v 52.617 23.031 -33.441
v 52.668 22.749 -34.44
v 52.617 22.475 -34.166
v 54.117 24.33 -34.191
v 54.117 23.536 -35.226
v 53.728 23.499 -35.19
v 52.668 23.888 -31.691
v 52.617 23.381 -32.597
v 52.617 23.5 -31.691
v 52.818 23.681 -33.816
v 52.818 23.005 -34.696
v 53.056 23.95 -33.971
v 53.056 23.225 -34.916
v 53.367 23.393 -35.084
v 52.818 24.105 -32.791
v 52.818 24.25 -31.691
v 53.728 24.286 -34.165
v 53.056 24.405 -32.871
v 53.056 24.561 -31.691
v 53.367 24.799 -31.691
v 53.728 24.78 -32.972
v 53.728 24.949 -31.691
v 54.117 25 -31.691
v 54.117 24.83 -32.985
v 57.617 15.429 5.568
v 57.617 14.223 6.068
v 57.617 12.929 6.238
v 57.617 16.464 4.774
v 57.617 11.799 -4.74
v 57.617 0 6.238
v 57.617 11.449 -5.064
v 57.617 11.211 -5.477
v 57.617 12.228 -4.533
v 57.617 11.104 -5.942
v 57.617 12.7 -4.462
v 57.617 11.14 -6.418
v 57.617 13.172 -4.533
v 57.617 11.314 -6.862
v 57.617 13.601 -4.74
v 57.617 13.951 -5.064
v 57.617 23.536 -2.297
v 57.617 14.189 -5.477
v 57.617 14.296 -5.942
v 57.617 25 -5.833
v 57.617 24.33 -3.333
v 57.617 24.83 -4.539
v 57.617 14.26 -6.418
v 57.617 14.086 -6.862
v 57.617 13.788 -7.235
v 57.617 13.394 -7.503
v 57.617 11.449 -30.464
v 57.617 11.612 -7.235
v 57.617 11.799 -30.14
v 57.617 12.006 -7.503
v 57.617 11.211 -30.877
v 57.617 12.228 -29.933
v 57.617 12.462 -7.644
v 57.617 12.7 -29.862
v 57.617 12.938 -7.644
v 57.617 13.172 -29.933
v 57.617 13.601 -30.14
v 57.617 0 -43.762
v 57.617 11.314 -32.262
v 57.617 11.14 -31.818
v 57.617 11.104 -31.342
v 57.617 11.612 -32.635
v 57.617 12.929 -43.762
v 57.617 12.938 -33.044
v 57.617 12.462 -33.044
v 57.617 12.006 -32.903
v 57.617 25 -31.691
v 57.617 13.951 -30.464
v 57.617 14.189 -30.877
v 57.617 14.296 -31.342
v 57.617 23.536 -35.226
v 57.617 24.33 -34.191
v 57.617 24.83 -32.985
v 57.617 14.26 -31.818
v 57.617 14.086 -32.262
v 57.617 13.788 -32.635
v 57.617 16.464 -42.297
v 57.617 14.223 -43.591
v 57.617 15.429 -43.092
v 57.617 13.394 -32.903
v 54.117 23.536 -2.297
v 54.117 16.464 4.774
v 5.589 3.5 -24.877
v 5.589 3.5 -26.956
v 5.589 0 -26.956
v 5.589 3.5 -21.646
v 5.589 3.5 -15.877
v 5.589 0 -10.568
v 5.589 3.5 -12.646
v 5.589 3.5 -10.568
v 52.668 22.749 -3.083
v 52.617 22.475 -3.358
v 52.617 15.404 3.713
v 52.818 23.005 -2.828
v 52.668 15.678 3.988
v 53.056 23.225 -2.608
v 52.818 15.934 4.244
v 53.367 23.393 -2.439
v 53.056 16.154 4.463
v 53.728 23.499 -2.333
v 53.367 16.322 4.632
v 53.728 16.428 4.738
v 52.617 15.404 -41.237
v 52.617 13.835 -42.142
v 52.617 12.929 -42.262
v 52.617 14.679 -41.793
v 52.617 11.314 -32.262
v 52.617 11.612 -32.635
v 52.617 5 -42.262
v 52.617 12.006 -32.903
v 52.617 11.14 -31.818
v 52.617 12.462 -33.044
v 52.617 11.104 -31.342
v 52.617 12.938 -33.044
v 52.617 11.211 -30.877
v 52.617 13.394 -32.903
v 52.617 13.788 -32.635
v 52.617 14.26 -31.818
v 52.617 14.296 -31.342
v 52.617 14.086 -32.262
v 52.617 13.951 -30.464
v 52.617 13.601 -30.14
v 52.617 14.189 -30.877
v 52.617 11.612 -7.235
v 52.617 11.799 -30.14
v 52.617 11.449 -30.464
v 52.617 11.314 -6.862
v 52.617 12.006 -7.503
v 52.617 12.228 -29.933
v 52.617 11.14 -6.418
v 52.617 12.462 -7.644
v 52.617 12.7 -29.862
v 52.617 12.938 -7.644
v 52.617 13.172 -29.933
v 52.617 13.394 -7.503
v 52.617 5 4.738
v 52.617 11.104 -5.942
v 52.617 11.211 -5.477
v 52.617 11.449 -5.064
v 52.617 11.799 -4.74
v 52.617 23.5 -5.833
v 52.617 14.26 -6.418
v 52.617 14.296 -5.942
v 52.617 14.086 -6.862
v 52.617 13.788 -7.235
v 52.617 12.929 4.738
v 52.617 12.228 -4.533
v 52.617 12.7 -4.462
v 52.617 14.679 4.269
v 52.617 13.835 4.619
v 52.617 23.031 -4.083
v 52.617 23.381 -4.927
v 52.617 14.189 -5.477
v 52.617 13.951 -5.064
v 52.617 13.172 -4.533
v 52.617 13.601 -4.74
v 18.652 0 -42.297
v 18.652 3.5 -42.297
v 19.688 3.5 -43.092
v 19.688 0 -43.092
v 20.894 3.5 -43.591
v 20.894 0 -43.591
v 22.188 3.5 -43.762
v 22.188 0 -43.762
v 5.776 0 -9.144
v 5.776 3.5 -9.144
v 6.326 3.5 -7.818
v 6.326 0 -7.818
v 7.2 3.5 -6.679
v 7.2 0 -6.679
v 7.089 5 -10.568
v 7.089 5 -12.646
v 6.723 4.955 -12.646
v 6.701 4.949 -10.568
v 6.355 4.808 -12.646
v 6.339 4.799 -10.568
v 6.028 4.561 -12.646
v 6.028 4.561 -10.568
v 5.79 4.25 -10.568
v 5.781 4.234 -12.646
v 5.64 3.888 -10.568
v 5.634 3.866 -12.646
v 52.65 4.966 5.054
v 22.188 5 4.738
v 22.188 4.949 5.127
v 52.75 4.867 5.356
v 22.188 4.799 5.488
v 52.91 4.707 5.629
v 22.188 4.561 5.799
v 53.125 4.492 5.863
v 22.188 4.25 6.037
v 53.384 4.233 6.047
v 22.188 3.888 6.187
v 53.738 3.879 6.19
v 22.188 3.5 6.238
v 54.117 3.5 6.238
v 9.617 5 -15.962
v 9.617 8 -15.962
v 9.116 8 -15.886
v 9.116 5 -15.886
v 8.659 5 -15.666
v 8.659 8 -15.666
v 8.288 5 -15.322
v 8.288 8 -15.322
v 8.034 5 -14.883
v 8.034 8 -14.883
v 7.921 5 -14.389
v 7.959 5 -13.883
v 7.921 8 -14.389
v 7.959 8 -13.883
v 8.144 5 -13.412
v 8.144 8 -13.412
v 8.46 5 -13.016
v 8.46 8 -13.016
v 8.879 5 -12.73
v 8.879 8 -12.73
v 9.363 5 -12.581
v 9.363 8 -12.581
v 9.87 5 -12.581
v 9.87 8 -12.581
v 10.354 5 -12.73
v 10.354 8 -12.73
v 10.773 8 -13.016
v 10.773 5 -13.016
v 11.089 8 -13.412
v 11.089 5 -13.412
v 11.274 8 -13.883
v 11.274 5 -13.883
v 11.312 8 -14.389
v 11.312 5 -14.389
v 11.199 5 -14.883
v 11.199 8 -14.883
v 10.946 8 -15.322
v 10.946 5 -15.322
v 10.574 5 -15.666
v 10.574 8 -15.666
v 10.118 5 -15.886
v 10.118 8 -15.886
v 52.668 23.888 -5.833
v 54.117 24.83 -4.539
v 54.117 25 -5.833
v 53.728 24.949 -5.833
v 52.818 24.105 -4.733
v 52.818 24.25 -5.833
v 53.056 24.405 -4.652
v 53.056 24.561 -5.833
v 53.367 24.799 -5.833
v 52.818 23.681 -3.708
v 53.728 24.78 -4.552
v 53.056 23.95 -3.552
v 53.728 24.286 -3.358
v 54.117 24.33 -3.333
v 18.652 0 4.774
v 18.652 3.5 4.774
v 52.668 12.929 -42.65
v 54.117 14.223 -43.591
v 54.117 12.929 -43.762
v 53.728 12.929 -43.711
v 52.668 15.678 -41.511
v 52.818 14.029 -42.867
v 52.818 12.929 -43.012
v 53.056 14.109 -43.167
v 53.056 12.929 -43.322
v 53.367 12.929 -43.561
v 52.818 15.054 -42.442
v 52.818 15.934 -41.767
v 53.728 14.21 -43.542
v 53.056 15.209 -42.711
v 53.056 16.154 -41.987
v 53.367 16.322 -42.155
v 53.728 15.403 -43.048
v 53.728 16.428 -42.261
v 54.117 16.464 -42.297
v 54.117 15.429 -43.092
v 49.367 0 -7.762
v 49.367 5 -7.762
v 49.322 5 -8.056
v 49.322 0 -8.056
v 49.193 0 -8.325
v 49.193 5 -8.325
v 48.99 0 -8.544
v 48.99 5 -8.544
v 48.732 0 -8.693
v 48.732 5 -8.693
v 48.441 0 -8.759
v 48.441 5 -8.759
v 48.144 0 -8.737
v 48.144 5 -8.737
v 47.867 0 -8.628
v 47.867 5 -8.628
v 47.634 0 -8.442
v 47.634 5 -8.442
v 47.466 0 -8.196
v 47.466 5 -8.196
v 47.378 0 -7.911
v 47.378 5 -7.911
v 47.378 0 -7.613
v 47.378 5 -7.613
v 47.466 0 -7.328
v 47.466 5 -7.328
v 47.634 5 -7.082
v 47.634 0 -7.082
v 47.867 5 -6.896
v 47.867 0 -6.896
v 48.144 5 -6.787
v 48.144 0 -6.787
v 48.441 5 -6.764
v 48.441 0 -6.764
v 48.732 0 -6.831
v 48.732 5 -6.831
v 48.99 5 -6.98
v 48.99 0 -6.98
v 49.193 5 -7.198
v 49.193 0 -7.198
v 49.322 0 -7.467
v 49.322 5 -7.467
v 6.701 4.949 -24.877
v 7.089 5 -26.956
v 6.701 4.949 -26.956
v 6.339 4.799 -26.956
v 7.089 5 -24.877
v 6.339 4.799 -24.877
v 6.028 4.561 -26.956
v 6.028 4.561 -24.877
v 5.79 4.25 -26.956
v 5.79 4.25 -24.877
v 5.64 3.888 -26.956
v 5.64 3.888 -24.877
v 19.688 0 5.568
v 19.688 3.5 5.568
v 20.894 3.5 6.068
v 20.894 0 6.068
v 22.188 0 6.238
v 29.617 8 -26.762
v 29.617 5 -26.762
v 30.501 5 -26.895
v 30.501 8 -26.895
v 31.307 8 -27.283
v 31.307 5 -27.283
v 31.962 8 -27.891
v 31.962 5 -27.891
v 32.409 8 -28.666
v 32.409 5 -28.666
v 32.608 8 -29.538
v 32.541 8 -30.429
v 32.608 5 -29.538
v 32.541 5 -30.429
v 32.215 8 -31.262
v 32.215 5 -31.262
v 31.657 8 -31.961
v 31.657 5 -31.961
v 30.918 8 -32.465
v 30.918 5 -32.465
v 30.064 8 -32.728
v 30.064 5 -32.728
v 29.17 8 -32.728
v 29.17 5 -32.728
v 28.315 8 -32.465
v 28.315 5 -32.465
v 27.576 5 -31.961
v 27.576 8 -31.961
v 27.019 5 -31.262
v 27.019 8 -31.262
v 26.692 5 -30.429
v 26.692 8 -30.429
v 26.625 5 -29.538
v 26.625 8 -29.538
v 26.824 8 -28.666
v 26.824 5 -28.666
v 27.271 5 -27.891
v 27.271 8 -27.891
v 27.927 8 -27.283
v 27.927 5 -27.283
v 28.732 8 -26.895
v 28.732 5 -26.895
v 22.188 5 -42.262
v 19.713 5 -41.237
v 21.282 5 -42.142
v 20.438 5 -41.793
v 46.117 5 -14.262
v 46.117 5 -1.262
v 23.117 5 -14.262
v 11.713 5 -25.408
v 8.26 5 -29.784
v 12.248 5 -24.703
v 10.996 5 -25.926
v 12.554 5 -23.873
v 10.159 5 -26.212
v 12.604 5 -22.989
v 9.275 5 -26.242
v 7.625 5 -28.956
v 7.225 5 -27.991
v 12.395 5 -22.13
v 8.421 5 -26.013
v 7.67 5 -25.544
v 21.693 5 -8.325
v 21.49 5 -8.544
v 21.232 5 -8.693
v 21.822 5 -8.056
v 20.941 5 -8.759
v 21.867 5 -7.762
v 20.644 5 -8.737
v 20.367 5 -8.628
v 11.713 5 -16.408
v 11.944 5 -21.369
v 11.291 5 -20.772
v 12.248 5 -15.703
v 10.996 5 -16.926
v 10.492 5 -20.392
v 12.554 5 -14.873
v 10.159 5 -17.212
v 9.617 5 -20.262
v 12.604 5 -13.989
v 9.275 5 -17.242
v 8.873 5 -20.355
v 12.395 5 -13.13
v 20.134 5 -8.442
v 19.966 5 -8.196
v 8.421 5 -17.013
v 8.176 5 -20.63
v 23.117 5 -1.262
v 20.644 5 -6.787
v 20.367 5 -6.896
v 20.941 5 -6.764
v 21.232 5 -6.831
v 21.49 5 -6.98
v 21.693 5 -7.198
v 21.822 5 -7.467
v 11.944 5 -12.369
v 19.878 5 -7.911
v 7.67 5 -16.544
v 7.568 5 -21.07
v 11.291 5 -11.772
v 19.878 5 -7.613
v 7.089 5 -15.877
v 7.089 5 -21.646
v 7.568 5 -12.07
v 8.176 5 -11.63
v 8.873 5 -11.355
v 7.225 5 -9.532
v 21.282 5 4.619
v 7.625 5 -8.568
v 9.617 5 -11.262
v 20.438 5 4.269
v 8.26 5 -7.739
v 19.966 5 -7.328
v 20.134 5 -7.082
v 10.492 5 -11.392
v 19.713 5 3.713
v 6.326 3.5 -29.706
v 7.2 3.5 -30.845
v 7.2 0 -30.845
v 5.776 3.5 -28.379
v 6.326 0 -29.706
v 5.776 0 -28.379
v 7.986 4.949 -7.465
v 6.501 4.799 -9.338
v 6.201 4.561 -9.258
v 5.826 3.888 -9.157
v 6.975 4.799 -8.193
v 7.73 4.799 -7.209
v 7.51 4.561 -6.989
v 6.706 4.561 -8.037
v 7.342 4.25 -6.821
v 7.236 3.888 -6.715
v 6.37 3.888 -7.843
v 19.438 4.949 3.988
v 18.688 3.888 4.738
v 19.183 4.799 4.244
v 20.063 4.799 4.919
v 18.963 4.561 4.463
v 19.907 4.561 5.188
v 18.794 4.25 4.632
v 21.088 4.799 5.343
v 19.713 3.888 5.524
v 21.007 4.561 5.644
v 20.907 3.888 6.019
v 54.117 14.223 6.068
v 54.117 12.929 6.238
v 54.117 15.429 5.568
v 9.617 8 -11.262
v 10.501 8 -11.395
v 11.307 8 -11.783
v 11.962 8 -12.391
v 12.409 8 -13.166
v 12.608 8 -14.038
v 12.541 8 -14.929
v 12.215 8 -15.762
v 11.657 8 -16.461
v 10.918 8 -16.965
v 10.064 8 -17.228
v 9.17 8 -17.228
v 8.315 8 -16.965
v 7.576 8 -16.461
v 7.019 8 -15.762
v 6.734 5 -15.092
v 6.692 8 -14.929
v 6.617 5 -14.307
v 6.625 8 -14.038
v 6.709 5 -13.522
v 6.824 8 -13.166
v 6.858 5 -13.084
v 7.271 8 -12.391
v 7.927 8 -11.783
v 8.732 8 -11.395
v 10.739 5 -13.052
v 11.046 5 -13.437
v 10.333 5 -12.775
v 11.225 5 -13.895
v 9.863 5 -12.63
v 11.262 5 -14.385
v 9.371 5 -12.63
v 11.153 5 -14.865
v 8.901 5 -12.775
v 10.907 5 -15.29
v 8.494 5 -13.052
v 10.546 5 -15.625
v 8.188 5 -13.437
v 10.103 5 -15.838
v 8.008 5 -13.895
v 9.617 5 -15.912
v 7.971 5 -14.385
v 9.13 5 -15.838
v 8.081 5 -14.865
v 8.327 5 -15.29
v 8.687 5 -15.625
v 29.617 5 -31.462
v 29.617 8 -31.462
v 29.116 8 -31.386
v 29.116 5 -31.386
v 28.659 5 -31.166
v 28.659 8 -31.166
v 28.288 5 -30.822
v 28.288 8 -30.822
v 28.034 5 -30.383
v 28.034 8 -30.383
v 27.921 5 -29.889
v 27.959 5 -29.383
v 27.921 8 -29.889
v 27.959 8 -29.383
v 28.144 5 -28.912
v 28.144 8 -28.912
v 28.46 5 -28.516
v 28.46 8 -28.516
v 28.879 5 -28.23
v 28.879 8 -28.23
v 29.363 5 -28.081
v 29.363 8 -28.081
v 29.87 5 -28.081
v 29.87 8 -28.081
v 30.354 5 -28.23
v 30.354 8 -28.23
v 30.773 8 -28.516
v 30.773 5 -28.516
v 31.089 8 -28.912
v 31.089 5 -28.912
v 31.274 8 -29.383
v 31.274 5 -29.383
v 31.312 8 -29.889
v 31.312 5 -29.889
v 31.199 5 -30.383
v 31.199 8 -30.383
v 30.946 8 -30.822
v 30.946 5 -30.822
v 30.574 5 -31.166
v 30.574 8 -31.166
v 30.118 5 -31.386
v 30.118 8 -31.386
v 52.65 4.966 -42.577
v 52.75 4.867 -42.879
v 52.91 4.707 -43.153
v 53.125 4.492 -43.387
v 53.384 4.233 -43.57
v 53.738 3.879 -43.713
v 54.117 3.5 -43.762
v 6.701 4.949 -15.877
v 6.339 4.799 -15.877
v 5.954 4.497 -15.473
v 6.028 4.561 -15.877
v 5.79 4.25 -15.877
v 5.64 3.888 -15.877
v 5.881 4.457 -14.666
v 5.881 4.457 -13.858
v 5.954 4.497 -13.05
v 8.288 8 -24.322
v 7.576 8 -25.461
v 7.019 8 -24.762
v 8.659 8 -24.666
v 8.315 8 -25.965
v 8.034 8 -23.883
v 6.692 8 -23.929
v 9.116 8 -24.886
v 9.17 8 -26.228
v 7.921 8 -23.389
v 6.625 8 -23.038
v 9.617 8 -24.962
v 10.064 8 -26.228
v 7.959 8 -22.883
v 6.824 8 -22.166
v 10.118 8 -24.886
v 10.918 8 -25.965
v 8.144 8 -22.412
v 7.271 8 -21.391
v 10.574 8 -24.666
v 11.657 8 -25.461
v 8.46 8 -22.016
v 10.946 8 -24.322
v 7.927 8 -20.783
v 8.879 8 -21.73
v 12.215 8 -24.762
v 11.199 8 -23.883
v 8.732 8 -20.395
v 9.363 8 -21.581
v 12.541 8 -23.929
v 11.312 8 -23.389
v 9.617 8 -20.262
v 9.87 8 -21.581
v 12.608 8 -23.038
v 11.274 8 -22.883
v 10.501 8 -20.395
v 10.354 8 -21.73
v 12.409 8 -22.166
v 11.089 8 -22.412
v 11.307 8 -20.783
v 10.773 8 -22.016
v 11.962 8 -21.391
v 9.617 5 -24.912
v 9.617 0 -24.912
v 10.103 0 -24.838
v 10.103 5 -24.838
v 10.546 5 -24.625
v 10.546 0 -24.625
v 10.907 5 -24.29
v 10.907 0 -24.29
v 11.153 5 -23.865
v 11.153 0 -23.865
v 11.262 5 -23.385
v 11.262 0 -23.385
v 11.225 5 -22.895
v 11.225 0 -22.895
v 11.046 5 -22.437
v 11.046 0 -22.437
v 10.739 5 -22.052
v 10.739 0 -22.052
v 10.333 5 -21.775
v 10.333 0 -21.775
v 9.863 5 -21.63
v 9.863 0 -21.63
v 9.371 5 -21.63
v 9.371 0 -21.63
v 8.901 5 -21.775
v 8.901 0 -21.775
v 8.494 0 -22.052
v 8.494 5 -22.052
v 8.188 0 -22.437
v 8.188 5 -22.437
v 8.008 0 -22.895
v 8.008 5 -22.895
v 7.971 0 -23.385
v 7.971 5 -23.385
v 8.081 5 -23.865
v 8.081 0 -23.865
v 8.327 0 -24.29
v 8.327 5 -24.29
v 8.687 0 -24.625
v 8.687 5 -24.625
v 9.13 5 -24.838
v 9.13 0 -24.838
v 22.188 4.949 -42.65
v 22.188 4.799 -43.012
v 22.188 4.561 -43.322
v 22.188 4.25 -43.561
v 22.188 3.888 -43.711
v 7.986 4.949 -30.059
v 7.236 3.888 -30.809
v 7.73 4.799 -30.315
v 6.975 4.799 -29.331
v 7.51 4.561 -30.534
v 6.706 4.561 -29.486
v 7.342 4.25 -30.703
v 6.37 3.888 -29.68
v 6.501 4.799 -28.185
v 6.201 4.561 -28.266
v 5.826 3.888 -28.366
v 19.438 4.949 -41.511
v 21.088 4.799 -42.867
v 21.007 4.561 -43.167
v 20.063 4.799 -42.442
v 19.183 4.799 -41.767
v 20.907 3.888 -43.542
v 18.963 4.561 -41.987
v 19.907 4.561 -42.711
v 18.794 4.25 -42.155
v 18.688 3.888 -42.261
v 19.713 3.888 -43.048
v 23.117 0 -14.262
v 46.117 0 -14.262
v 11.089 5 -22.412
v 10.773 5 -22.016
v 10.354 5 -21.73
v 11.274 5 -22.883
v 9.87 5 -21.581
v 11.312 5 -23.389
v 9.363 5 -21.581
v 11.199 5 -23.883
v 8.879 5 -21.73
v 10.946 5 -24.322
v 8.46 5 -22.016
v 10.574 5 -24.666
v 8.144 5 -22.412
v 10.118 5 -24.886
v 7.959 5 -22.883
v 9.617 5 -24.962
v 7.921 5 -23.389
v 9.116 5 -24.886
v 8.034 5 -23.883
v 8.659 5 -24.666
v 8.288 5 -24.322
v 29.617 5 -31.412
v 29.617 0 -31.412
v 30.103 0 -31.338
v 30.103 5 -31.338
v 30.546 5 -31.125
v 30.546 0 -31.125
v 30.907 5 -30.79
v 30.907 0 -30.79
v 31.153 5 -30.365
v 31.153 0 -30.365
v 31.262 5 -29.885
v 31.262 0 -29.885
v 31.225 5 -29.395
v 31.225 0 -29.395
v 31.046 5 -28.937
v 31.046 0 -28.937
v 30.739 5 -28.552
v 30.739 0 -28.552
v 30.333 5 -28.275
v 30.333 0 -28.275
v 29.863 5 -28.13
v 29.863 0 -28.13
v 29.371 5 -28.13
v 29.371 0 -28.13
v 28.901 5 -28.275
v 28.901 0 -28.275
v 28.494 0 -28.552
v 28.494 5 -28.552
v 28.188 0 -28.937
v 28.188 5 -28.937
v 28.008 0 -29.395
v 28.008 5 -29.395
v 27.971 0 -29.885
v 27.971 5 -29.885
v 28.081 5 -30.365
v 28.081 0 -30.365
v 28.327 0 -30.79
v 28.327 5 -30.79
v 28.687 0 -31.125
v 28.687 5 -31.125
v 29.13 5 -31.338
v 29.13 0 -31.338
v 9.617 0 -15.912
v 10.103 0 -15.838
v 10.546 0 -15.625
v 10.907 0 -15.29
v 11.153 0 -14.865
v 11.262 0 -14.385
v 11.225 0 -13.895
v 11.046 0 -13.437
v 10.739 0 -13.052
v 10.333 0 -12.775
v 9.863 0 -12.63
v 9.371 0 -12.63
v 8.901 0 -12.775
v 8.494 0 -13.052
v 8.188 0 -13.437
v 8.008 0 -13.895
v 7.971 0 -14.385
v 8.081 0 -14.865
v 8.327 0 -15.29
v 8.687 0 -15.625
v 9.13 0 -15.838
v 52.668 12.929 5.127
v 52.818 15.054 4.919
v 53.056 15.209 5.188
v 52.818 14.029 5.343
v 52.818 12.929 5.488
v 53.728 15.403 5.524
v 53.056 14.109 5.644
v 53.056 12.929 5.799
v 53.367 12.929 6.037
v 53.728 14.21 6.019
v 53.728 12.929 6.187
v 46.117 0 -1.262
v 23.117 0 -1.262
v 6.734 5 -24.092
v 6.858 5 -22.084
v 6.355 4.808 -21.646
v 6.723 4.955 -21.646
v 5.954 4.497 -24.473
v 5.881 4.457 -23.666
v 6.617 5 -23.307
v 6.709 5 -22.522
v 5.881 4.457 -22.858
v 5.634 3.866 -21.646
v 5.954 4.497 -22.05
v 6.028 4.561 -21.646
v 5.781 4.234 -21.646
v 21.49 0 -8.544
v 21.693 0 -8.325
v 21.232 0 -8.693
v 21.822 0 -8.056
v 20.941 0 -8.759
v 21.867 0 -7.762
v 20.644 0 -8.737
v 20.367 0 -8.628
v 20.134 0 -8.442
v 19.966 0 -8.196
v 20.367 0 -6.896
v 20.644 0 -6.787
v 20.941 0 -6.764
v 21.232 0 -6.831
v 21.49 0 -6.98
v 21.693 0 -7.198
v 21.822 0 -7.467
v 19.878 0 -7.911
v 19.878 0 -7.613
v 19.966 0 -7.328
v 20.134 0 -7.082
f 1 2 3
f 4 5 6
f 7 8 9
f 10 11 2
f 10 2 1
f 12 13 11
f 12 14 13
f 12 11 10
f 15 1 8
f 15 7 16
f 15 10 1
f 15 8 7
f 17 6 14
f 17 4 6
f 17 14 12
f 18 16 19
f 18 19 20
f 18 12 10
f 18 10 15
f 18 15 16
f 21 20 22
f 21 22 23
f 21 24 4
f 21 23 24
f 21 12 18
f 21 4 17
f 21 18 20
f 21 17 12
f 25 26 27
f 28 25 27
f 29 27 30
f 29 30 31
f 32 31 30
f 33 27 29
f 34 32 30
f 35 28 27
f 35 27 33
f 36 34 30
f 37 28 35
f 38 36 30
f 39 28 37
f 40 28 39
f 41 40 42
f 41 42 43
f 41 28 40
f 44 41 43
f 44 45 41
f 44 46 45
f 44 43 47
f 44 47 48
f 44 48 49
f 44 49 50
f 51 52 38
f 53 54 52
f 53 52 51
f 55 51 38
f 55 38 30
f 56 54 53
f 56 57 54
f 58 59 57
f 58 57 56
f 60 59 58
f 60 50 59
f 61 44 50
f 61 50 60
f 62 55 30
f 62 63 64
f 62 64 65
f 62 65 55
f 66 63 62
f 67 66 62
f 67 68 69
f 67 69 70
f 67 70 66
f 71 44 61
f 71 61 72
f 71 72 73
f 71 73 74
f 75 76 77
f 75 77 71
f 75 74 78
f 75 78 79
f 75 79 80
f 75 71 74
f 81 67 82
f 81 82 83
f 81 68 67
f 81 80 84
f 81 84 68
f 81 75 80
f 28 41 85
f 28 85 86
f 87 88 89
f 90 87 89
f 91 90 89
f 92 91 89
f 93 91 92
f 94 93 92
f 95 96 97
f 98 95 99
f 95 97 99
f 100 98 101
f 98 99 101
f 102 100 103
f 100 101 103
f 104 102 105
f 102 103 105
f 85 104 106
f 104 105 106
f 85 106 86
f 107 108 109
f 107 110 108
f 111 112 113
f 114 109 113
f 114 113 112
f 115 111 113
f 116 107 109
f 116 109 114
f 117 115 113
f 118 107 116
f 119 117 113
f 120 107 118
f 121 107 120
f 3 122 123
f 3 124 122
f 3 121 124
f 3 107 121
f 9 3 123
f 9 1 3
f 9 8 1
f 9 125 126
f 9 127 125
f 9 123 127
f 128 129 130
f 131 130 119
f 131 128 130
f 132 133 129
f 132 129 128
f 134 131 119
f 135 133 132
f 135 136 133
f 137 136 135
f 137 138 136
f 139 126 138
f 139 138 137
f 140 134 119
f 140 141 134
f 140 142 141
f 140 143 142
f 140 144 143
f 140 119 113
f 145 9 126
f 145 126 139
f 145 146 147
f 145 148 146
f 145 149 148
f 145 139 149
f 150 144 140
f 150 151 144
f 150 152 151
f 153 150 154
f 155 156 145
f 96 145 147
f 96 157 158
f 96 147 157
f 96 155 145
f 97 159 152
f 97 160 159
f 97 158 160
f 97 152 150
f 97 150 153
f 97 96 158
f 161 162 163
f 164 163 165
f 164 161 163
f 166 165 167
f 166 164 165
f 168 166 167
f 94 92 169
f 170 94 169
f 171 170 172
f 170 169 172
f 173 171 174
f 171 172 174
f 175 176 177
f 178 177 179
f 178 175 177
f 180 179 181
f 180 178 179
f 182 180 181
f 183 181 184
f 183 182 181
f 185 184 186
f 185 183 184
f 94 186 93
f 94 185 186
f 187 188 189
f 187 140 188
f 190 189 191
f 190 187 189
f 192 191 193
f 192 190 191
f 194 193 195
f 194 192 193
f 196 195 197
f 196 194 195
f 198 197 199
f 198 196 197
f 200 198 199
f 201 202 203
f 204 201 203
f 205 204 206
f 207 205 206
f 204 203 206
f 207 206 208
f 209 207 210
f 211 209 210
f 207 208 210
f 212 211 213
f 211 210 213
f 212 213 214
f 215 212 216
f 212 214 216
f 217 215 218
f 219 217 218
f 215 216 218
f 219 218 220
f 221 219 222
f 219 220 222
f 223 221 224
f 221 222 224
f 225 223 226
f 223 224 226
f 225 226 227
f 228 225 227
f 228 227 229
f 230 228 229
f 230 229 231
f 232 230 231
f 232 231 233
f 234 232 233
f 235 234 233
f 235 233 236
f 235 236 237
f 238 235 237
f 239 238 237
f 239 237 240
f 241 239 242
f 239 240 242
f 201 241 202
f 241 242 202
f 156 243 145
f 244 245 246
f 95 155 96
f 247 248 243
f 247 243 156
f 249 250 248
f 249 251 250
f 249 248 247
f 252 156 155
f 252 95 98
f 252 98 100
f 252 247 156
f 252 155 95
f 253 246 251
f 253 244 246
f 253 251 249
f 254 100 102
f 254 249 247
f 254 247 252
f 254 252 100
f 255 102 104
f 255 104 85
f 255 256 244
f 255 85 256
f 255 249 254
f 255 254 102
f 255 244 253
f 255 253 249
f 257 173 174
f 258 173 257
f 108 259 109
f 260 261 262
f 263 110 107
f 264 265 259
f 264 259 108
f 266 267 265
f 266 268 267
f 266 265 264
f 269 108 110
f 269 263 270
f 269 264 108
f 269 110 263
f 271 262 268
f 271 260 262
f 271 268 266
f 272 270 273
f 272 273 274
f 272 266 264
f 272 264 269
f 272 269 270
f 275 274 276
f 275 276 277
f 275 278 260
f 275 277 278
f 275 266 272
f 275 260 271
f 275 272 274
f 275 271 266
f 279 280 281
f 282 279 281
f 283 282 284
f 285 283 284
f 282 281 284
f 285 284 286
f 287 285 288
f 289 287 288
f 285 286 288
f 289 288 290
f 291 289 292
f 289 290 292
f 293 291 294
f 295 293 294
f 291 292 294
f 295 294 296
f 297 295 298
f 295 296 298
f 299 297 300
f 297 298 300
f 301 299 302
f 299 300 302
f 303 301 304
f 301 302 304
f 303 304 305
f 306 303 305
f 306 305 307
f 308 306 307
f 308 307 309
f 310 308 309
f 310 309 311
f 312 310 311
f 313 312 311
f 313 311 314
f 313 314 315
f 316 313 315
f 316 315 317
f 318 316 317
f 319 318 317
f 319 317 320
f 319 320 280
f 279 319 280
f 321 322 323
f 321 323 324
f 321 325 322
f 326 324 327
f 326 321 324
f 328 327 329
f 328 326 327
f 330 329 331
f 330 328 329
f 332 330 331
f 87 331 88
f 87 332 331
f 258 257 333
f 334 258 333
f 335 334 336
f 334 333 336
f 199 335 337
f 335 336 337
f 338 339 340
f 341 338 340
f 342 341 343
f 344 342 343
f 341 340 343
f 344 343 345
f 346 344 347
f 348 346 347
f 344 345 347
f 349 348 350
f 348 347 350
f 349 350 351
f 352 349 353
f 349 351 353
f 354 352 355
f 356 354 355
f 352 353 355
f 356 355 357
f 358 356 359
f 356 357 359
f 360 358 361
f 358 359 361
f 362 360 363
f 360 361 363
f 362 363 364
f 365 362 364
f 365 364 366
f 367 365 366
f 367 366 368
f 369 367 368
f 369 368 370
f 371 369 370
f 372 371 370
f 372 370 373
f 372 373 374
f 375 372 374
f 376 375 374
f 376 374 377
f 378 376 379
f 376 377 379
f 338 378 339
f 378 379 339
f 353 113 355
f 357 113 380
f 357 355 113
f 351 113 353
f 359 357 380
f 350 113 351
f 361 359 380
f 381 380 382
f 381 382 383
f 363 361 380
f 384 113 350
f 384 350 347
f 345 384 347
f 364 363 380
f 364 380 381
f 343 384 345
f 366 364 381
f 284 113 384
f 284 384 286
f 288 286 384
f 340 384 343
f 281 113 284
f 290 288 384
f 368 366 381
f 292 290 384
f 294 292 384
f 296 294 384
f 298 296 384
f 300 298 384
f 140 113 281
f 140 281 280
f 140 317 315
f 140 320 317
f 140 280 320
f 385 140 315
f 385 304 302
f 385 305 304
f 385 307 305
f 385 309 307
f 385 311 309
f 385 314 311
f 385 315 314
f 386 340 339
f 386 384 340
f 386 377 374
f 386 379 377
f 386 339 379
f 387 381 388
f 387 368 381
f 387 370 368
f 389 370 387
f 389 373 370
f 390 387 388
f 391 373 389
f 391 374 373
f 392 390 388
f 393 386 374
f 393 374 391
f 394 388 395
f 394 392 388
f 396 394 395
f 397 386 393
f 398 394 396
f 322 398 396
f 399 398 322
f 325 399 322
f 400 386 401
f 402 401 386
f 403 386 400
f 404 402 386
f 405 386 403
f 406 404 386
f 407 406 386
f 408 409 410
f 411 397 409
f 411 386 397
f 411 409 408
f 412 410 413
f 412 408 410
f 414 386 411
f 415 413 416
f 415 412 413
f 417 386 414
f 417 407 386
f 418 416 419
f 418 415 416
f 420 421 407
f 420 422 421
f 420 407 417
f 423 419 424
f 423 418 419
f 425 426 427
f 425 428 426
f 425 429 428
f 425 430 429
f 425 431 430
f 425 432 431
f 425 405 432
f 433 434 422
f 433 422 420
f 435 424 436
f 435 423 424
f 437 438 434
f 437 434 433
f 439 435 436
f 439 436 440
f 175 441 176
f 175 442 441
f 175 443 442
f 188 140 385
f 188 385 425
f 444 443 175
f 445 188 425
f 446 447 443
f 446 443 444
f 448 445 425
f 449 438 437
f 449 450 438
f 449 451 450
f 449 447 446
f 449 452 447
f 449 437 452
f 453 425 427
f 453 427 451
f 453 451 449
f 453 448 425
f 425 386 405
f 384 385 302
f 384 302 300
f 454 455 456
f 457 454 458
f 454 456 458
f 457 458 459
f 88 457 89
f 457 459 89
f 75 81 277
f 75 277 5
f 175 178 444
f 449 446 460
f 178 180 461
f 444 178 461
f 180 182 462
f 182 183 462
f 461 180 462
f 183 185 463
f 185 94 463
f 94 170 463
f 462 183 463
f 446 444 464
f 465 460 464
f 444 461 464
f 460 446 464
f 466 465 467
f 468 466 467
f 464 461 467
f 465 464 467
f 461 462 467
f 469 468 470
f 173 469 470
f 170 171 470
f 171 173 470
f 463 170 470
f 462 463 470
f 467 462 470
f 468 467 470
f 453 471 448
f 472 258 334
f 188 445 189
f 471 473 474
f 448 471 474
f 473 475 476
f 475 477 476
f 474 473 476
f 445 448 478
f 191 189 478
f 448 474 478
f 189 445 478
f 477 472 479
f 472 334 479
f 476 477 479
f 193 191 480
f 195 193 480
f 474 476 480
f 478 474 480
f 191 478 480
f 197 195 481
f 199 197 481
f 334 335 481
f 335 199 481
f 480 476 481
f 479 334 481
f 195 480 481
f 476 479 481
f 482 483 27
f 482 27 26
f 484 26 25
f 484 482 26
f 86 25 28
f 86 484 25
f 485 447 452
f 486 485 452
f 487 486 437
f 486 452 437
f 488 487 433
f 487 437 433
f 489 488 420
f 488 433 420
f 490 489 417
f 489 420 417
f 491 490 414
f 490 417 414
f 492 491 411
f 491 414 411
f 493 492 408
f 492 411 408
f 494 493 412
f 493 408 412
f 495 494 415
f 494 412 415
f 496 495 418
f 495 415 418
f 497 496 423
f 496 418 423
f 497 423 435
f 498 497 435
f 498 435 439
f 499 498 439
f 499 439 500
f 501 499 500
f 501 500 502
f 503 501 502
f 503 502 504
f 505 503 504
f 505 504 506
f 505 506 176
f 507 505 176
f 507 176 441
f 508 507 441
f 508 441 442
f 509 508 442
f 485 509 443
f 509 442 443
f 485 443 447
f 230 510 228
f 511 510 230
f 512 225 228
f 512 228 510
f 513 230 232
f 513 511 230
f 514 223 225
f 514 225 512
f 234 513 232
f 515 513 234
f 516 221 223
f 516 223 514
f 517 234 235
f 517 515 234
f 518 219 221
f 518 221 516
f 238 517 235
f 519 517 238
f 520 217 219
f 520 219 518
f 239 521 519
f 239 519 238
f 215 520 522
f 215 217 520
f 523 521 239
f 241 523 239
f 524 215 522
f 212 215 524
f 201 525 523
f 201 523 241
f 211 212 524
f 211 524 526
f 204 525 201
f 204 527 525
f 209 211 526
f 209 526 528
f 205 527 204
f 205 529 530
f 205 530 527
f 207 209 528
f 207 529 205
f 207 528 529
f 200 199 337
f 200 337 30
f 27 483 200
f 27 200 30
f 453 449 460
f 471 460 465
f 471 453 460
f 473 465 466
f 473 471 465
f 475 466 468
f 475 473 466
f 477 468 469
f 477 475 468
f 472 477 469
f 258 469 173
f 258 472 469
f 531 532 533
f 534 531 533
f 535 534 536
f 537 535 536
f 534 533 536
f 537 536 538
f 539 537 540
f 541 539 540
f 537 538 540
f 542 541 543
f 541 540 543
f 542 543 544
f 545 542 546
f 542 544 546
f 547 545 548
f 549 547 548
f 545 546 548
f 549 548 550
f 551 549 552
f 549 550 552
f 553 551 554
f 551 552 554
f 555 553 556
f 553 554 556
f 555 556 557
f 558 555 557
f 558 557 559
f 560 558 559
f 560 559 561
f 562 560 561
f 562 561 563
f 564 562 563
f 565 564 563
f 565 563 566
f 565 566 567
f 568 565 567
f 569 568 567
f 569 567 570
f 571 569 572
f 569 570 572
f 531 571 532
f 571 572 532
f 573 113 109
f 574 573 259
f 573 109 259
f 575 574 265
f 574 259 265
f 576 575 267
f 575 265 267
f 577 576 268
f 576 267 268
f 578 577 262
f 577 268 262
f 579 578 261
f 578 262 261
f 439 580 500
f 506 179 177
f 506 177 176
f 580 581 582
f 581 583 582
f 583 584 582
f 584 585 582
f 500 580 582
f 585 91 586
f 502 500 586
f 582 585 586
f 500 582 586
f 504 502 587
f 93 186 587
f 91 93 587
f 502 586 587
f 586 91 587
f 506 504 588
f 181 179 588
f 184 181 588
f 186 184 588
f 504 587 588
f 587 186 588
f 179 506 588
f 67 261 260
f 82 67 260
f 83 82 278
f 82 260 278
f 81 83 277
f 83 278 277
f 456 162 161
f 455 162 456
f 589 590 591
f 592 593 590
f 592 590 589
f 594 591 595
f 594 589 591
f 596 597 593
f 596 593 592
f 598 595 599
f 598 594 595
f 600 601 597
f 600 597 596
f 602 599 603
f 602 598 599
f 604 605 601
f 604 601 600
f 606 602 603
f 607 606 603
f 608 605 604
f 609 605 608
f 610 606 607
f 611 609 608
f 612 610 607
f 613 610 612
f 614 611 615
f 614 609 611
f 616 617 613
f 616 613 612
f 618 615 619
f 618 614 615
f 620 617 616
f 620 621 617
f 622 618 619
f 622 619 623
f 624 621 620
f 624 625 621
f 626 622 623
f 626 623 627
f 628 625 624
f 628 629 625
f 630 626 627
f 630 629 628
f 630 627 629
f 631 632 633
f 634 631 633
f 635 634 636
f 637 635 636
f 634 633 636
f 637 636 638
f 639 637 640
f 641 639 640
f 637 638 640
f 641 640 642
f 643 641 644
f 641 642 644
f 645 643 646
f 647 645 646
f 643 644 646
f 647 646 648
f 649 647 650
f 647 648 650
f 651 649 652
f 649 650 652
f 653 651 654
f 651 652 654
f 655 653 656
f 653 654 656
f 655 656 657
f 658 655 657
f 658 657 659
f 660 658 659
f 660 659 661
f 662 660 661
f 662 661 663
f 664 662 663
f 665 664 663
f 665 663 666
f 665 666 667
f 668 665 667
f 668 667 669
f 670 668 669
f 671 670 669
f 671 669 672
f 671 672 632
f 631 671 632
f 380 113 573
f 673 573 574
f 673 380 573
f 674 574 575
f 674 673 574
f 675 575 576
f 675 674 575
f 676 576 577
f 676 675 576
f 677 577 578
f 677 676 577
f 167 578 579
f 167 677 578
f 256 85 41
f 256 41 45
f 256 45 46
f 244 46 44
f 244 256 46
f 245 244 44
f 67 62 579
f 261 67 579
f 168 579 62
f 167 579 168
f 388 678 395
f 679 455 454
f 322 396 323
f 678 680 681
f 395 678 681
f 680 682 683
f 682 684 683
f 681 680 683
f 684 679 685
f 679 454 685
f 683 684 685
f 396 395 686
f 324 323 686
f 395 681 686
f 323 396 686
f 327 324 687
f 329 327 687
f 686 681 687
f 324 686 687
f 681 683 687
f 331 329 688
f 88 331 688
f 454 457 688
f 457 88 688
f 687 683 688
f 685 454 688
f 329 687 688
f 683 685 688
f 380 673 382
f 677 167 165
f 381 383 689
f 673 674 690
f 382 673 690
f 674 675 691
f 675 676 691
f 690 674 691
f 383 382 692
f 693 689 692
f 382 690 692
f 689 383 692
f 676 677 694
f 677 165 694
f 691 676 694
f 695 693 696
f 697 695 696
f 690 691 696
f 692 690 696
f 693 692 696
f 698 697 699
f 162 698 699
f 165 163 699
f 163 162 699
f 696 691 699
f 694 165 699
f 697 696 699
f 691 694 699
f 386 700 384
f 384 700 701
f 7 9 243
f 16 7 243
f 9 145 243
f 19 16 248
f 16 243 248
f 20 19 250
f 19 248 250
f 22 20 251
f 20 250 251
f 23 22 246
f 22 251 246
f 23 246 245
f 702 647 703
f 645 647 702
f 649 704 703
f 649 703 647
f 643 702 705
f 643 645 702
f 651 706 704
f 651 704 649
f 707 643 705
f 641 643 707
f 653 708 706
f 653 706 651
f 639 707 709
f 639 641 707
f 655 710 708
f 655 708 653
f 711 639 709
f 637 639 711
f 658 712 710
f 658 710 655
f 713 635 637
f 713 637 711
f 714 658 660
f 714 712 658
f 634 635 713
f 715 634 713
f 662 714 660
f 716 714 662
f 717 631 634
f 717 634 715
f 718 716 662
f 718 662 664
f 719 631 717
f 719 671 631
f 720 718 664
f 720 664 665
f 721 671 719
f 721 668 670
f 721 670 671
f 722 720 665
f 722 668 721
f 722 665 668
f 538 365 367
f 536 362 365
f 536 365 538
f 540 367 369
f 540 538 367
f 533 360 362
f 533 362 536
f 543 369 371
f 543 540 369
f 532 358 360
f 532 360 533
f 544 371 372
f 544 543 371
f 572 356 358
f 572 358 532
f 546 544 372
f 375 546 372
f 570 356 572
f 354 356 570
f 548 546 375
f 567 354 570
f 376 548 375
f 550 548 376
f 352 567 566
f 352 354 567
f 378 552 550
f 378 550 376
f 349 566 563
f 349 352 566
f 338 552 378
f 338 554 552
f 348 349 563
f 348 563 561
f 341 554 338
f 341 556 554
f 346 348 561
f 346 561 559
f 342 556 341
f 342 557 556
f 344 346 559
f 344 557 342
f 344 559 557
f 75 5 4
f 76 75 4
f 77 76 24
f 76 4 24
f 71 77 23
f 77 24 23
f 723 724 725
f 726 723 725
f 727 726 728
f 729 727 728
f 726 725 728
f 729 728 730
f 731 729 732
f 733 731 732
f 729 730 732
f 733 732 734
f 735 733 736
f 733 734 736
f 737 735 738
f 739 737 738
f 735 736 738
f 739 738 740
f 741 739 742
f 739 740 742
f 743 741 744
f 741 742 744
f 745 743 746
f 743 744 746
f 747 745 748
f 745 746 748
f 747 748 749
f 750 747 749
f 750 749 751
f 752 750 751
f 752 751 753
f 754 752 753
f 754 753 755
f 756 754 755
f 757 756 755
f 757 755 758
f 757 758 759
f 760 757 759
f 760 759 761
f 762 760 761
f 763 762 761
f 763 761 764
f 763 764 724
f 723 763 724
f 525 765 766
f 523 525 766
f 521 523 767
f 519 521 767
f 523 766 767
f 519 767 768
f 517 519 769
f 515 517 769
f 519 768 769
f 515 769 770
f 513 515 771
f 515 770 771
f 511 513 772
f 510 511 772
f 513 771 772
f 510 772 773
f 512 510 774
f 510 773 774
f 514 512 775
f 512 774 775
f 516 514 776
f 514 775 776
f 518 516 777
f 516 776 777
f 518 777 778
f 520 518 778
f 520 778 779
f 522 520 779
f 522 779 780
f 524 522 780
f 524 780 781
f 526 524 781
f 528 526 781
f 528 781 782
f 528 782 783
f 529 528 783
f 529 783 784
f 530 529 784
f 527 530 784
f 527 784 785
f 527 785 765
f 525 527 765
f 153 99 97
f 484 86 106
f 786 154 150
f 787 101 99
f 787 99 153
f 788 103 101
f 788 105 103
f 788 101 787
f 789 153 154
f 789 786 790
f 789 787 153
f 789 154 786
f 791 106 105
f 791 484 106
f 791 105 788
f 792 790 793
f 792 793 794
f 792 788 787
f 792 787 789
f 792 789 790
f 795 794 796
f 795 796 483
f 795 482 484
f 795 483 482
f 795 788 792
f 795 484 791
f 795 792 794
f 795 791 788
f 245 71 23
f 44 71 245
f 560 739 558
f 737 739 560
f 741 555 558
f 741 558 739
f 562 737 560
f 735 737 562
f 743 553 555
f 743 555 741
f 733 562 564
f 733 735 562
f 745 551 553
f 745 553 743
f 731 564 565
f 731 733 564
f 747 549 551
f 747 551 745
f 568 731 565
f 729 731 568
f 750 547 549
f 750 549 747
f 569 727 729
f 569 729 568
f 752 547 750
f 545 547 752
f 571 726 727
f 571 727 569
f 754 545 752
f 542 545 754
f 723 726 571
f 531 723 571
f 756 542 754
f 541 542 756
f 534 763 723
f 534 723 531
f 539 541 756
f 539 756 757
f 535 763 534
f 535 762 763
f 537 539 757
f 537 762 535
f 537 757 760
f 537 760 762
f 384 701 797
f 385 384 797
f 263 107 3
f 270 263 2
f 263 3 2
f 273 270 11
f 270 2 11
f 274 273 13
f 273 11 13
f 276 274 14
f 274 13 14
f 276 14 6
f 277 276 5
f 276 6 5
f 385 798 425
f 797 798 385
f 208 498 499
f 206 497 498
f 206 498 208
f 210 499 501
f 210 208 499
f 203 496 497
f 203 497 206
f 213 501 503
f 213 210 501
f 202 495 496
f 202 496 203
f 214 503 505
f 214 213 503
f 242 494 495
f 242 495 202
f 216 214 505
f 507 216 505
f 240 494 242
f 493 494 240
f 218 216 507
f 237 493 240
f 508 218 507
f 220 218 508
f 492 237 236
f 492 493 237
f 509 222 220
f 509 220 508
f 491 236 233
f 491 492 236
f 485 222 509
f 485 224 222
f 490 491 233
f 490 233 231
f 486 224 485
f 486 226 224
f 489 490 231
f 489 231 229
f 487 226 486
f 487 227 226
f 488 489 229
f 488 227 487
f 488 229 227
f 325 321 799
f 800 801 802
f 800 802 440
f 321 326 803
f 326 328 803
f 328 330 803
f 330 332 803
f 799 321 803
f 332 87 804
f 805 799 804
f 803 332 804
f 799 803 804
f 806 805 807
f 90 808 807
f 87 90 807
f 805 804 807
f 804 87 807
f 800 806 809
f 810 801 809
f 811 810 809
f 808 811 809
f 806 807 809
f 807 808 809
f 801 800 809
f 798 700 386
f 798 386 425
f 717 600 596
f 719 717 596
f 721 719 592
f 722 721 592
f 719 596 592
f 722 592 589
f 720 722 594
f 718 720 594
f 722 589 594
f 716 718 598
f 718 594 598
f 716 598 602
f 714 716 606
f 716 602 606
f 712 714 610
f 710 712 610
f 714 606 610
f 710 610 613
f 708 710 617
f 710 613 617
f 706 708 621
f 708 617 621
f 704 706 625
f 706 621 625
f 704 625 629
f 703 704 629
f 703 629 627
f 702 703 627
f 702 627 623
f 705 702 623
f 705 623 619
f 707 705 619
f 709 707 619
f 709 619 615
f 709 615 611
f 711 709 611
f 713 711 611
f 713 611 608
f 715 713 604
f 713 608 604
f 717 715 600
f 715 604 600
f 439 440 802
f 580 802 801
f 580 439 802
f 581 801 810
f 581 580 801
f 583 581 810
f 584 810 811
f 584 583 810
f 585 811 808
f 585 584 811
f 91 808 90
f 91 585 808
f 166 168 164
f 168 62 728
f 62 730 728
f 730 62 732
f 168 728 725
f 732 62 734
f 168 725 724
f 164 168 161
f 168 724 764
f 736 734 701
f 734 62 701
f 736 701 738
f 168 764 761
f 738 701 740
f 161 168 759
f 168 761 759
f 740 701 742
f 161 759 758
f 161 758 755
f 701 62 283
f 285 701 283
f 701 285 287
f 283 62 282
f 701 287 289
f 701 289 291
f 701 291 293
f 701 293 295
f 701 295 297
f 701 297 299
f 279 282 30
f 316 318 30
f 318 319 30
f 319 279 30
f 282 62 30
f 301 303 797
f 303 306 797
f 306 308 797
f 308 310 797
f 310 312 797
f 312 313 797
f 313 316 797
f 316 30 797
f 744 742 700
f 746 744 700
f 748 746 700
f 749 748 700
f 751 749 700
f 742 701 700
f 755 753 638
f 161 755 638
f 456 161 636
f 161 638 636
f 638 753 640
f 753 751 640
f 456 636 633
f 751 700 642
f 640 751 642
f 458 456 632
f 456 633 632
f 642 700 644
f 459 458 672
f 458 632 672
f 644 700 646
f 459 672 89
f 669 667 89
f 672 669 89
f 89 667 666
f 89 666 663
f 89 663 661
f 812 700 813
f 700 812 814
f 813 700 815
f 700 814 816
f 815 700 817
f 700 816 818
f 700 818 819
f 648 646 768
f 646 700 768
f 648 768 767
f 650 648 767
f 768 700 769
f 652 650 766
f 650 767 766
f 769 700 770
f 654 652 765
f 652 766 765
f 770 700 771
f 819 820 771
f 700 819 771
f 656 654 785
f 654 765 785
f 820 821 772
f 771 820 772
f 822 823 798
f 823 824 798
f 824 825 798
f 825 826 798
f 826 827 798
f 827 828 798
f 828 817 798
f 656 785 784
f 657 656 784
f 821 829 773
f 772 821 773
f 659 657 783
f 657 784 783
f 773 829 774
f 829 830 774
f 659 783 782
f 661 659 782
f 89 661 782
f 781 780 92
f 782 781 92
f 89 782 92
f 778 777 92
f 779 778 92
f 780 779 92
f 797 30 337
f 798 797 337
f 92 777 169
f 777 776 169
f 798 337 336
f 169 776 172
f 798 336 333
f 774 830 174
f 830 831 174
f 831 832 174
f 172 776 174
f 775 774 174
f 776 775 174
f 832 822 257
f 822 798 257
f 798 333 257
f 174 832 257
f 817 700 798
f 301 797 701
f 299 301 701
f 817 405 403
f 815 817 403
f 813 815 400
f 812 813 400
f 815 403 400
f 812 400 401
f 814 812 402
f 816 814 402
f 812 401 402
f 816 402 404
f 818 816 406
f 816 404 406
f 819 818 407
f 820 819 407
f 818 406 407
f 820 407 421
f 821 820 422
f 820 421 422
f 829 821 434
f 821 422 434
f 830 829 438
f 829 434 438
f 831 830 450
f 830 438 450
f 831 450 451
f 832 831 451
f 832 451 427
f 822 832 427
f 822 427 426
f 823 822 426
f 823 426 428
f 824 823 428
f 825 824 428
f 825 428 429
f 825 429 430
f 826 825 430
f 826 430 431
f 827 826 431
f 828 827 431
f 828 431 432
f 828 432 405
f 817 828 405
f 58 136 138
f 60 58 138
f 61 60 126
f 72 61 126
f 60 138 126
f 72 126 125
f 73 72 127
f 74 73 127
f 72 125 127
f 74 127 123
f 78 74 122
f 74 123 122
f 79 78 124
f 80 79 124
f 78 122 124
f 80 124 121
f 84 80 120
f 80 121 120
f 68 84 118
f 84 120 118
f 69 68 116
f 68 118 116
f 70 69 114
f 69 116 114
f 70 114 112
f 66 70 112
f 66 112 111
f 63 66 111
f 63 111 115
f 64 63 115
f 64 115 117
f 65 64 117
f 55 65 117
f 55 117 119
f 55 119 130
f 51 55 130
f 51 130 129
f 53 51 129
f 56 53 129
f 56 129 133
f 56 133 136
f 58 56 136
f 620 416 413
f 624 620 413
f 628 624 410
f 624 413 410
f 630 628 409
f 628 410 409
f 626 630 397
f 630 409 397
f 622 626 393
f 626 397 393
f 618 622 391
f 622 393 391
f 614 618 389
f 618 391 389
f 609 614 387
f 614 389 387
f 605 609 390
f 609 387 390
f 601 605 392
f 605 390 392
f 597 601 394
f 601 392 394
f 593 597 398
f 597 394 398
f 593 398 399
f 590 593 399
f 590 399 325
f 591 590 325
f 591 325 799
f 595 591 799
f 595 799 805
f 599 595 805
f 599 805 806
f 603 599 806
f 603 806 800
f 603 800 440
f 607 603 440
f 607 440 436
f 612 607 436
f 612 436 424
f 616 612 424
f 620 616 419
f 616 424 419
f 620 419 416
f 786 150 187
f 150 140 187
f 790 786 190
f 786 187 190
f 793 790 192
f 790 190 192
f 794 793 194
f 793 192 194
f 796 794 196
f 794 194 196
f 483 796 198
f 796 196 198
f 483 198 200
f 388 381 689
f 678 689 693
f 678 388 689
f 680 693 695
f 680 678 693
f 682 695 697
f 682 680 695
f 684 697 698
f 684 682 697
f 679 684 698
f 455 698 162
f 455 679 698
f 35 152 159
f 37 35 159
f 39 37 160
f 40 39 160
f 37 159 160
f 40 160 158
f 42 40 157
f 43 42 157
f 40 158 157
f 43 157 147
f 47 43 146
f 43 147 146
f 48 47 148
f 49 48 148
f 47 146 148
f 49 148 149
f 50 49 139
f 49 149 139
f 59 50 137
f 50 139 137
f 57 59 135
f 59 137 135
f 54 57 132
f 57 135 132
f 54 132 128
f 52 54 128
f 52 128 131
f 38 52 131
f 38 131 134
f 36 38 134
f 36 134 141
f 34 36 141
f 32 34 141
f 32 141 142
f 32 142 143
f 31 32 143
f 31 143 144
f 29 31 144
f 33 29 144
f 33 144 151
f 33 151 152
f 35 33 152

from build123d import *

# Parameters (mm, degrees)
BOSS_EXTRUDE1_DEPTH       = 5
SKETCH2_W                 = 5
SKETCH2_H                 = 50
BOSS_EXTRUDE2_DEPTH       = 10
BOSS_EXTRUDE3_DEPTH       = 5
SKETCH4_R                 = 3
BOSS_EXTRUDE4_DEPTH       = 3
SKETCH5_R                 = 1.7
CUT_EXTRUDE1_DEPTH        = 3
SKETCH6_R                 = 1.65
CUT_EXTRUDE2_DEPTH        = 77.549140495
SKETCH7_R                 = 3
BOSS_EXTRUDE5_DEPTH       = 3
SKETCH8_R                 = 1.7
CUT_EXTRUDE3_DEPTH        = 3
SKETCH9_R                 = 1.65
CUT_EXTRUDE4_DEPTH        = 77.549140495
SKETCH10_W                = 23
SKETCH10_H                = 13
CUT_EXTRUDE5_DEPTH        = 77.549140495
SKETCH11_R                = 3
BOSS_EXTRUDE6_DEPTH       = 3
SKETCH12_R                = 1.7
CUT_EXTRUDE6_DEPTH        = 3
SKETCH13_R                = 1.65
CUT_EXTRUDE7_DEPTH        = 77.549140495
F_1_CLEARANCE_HOLE1_D     = 2
F_1_CLEARANCE_HOLE1_DEPTH = 25
F_4_CLEARANCE_HOLE1_D     = 3.2
FILLET1_R                 = 5
FILLET2_R                 = 5.5
FILLET3_R                 = 1.5


with BuildPart() as part:
    # Sketch1 → Boss-Extrude1 (new body)
    with BuildSketch(Plane(origin=(57.616701934, 0, 0), x_dir=(0, 0, -1), z_dir=(1, 0, 0))):
        Polygon((-6.238297922, 15), (43.761702078, 15), (33.761702078, 25), (3.761702078, 25), align=None)
    extrude(amount=-BOSS_EXTRUDE1_DEPTH)

    # Sketch2 → Boss-Extrude2 (add)
    with BuildSketch(Plane.XZ.offset(-15)):
        with Locations((55.116701934, -18.761702078)):
            Rectangle(SKETCH2_W, SKETCH2_H)
    extrude(amount=BOSS_EXTRUDE2_DEPTH)

    # Sketch3 → Boss-Extrude3 (add)
    with BuildSketch(Plane.XZ.offset(-5)):
        Polygon((5.588924157, -29.2339243), (5.588924157, -8.289479856), (20.116701934, 6.238297922), (57.616701934, 6.238297922), (57.616701934, -43.761702078), (20.116701934, -43.761702078), align=None)
    extrude(amount=BOSS_EXTRUDE3_DEPTH)

    # Sketch4 → Boss-Extrude4 (add)
    with BuildSketch(Plane(origin=(0, 5, 0), x_dir=(-1, 0, 0), z_dir=(0, 1, 0))):
        with Locations(Location((-29.616701934, -29.761702078, 0), (0, 0, 90))):
            Circle(SKETCH4_R)
    extrude(amount=BOSS_EXTRUDE4_DEPTH)

    # Sketch5 → Cut-Extrude1 (cut)
    with BuildSketch(Plane(origin=(0, 8, 0), x_dir=(-1, 0, 0), z_dir=(0, 1, 0))):
        with Locations(Location((-29.616701934, -29.761702078, 0), (0, 0, 270))):
            Circle(SKETCH5_R)
    extrude(amount=-CUT_EXTRUDE1_DEPTH, mode=Mode.SUBTRACT)

    # Sketch6 → Cut-Extrude2 (cut, through all)
    with BuildSketch(Plane.XZ):
        with Locations(Location((29.616701934, -29.761702078, 0), (0, 0, 270))):
            Circle(SKETCH6_R)
    extrude(amount=-CUT_EXTRUDE2_DEPTH, mode=Mode.SUBTRACT)

    # Sketch7 → Boss-Extrude5 (add)
    with BuildSketch(Plane(origin=(0, 5, 0), x_dir=(-1, 0, 0), z_dir=(0, 1, 0))):
        with Locations(Location((-9.616701934, -23.261702078, 0), (0, 0, 90))):
            Circle(SKETCH7_R)
    extrude(amount=BOSS_EXTRUDE5_DEPTH)

    # Sketch8 → Cut-Extrude3 (cut)
    with BuildSketch(Plane(origin=(0, 8, 0), x_dir=(-1, 0, 0), z_dir=(0, 1, 0))):
        with Locations(Location((-9.616701934, -23.261702078, 0), (0, 0, 270))):
            Circle(SKETCH8_R)
    extrude(amount=-CUT_EXTRUDE3_DEPTH, mode=Mode.SUBTRACT)

    # Sketch9 → Cut-Extrude4 (cut, through all)
    with BuildSketch(Plane.XZ):
        with Locations(Location((9.616701934, -23.261702078, 0), (0, 0, 270))):
            Circle(SKETCH9_R)
    extrude(amount=-CUT_EXTRUDE4_DEPTH, mode=Mode.SUBTRACT)

    # Sketch10 → Cut-Extrude5 (cut, through all)
    with BuildSketch(Plane.XZ):
        with Locations((34.616701934, -7.761702078)):
            Rectangle(SKETCH10_W, SKETCH10_H)
    extrude(amount=-CUT_EXTRUDE5_DEPTH, mode=Mode.SUBTRACT)

    # Sketch11 → Boss-Extrude6 (add)
    with BuildSketch(Plane(origin=(0, 5, 0), x_dir=(-1, 0, 0), z_dir=(0, 1, 0))):
        with Locations(Location((-9.616701934, -14.261702078, 0), (0, 0, 90))):
            Circle(SKETCH11_R)
    extrude(amount=BOSS_EXTRUDE6_DEPTH)

    # Sketch12 → Cut-Extrude6 (cut)
    with BuildSketch(Plane(origin=(0, 8, 0), x_dir=(-1, 0, 0), z_dir=(0, 1, 0))):
        with Locations(Location((-9.616701934, -14.261702078, 0), (0, 0, 270))):
            Circle(SKETCH12_R)
    extrude(amount=-CUT_EXTRUDE6_DEPTH, mode=Mode.SUBTRACT)

    # Sketch13 → Cut-Extrude7 (cut, through all)
    with BuildSketch(Plane.XZ):
        with Locations(Location((9.616701934, -14.261702078, 0), (0, 0, 270))):
            Circle(SKETCH13_R)
    extrude(amount=-CUT_EXTRUDE7_DEPTH, mode=Mode.SUBTRACT)

    # #1 Clearance Hole1
    with Locations(Plane(origin=(0, 0, 0), x_dir=(-1, 0, 0), z_dir=(0, -1, 0))):
        with Locations((-48.366701934, 7.761702078), (-20.866701934, 7.761702078)):
            Hole(F_1_CLEARANCE_HOLE1_D / 2, depth=F_1_CLEARANCE_HOLE1_DEPTH)

    # #4 Clearance Hole1 (through all)
    with Locations(Plane(origin=(57.616701934, 0, 0), x_dir=(0, 0, -1), z_dir=(1, 0, 0))):
        with Locations((31.461702078, 12.7), (6.061702078, 12.7)):
            Hole(F_4_CLEARANCE_HOLE1_D / 2)

    # Fillet1
    fillet1_edges = [part.edges().sort_by_distance(p)[0] for p in [
        (20.116701934, 2.5, -43.761702078),
        (20.116701934, 2.5, 6.238297922),
        (55.116701934, 25, -3.761702078),
        (55.116701934, 25, -33.761702078),
        (55.116701934, 15, -43.761702078),
        (55.116701934, 15, 6.238297922),
    ]]
    fillet(fillet1_edges, radius=FILLET1_R)

    # Fillet2
    fillet2_edges = [part.edges().sort_by_distance(p)[0] for p in [
        (5.588924157, 2.5, -29.2339243),
        (5.588924157, 2.5, -8.289479856),
    ]]
    fillet(fillet2_edges, radius=FILLET2_R)

    # Fillet3
    fillet3_edges = [part.edges().sort_by_distance(p)[0] for p in [
        (52.616701934, 25, -18.761702078),
        (52.616701934, 20, 1.238297922),
        (52.616701934, 20, -38.761702078),
        (52.616701934, 14.84234935, 5.857695585),
        (52.616701934, 24.619397663, -33.604051428),
        (52.616701934, 14.84234935, -43.38109974),
        (52.616701934, 8.964466094, -43.761702078),
        (52.616701934, 24.619397663, -3.919352728),
        (37.40223584, 5, -43.761702078),
        (12.92603635, 5, -0.952367662),
        (20.274352584, 5, 5.857695585),
        (20.274352584, 5, -43.38109974),
        (52.616701934, 8.964466094, 6.238297922),
        (5.588924157, 5, -18.761702078),
        (12.92603635, 5, -36.571036494),
        (6.007586728, 5, -29.060508585),
        (6.007586728, 5, -8.462895571),
        (37.40223584, 5, 6.238297922),
    ]]
    fillet(fillet3_edges, radius=FILLET3_R)


solid = part.part
